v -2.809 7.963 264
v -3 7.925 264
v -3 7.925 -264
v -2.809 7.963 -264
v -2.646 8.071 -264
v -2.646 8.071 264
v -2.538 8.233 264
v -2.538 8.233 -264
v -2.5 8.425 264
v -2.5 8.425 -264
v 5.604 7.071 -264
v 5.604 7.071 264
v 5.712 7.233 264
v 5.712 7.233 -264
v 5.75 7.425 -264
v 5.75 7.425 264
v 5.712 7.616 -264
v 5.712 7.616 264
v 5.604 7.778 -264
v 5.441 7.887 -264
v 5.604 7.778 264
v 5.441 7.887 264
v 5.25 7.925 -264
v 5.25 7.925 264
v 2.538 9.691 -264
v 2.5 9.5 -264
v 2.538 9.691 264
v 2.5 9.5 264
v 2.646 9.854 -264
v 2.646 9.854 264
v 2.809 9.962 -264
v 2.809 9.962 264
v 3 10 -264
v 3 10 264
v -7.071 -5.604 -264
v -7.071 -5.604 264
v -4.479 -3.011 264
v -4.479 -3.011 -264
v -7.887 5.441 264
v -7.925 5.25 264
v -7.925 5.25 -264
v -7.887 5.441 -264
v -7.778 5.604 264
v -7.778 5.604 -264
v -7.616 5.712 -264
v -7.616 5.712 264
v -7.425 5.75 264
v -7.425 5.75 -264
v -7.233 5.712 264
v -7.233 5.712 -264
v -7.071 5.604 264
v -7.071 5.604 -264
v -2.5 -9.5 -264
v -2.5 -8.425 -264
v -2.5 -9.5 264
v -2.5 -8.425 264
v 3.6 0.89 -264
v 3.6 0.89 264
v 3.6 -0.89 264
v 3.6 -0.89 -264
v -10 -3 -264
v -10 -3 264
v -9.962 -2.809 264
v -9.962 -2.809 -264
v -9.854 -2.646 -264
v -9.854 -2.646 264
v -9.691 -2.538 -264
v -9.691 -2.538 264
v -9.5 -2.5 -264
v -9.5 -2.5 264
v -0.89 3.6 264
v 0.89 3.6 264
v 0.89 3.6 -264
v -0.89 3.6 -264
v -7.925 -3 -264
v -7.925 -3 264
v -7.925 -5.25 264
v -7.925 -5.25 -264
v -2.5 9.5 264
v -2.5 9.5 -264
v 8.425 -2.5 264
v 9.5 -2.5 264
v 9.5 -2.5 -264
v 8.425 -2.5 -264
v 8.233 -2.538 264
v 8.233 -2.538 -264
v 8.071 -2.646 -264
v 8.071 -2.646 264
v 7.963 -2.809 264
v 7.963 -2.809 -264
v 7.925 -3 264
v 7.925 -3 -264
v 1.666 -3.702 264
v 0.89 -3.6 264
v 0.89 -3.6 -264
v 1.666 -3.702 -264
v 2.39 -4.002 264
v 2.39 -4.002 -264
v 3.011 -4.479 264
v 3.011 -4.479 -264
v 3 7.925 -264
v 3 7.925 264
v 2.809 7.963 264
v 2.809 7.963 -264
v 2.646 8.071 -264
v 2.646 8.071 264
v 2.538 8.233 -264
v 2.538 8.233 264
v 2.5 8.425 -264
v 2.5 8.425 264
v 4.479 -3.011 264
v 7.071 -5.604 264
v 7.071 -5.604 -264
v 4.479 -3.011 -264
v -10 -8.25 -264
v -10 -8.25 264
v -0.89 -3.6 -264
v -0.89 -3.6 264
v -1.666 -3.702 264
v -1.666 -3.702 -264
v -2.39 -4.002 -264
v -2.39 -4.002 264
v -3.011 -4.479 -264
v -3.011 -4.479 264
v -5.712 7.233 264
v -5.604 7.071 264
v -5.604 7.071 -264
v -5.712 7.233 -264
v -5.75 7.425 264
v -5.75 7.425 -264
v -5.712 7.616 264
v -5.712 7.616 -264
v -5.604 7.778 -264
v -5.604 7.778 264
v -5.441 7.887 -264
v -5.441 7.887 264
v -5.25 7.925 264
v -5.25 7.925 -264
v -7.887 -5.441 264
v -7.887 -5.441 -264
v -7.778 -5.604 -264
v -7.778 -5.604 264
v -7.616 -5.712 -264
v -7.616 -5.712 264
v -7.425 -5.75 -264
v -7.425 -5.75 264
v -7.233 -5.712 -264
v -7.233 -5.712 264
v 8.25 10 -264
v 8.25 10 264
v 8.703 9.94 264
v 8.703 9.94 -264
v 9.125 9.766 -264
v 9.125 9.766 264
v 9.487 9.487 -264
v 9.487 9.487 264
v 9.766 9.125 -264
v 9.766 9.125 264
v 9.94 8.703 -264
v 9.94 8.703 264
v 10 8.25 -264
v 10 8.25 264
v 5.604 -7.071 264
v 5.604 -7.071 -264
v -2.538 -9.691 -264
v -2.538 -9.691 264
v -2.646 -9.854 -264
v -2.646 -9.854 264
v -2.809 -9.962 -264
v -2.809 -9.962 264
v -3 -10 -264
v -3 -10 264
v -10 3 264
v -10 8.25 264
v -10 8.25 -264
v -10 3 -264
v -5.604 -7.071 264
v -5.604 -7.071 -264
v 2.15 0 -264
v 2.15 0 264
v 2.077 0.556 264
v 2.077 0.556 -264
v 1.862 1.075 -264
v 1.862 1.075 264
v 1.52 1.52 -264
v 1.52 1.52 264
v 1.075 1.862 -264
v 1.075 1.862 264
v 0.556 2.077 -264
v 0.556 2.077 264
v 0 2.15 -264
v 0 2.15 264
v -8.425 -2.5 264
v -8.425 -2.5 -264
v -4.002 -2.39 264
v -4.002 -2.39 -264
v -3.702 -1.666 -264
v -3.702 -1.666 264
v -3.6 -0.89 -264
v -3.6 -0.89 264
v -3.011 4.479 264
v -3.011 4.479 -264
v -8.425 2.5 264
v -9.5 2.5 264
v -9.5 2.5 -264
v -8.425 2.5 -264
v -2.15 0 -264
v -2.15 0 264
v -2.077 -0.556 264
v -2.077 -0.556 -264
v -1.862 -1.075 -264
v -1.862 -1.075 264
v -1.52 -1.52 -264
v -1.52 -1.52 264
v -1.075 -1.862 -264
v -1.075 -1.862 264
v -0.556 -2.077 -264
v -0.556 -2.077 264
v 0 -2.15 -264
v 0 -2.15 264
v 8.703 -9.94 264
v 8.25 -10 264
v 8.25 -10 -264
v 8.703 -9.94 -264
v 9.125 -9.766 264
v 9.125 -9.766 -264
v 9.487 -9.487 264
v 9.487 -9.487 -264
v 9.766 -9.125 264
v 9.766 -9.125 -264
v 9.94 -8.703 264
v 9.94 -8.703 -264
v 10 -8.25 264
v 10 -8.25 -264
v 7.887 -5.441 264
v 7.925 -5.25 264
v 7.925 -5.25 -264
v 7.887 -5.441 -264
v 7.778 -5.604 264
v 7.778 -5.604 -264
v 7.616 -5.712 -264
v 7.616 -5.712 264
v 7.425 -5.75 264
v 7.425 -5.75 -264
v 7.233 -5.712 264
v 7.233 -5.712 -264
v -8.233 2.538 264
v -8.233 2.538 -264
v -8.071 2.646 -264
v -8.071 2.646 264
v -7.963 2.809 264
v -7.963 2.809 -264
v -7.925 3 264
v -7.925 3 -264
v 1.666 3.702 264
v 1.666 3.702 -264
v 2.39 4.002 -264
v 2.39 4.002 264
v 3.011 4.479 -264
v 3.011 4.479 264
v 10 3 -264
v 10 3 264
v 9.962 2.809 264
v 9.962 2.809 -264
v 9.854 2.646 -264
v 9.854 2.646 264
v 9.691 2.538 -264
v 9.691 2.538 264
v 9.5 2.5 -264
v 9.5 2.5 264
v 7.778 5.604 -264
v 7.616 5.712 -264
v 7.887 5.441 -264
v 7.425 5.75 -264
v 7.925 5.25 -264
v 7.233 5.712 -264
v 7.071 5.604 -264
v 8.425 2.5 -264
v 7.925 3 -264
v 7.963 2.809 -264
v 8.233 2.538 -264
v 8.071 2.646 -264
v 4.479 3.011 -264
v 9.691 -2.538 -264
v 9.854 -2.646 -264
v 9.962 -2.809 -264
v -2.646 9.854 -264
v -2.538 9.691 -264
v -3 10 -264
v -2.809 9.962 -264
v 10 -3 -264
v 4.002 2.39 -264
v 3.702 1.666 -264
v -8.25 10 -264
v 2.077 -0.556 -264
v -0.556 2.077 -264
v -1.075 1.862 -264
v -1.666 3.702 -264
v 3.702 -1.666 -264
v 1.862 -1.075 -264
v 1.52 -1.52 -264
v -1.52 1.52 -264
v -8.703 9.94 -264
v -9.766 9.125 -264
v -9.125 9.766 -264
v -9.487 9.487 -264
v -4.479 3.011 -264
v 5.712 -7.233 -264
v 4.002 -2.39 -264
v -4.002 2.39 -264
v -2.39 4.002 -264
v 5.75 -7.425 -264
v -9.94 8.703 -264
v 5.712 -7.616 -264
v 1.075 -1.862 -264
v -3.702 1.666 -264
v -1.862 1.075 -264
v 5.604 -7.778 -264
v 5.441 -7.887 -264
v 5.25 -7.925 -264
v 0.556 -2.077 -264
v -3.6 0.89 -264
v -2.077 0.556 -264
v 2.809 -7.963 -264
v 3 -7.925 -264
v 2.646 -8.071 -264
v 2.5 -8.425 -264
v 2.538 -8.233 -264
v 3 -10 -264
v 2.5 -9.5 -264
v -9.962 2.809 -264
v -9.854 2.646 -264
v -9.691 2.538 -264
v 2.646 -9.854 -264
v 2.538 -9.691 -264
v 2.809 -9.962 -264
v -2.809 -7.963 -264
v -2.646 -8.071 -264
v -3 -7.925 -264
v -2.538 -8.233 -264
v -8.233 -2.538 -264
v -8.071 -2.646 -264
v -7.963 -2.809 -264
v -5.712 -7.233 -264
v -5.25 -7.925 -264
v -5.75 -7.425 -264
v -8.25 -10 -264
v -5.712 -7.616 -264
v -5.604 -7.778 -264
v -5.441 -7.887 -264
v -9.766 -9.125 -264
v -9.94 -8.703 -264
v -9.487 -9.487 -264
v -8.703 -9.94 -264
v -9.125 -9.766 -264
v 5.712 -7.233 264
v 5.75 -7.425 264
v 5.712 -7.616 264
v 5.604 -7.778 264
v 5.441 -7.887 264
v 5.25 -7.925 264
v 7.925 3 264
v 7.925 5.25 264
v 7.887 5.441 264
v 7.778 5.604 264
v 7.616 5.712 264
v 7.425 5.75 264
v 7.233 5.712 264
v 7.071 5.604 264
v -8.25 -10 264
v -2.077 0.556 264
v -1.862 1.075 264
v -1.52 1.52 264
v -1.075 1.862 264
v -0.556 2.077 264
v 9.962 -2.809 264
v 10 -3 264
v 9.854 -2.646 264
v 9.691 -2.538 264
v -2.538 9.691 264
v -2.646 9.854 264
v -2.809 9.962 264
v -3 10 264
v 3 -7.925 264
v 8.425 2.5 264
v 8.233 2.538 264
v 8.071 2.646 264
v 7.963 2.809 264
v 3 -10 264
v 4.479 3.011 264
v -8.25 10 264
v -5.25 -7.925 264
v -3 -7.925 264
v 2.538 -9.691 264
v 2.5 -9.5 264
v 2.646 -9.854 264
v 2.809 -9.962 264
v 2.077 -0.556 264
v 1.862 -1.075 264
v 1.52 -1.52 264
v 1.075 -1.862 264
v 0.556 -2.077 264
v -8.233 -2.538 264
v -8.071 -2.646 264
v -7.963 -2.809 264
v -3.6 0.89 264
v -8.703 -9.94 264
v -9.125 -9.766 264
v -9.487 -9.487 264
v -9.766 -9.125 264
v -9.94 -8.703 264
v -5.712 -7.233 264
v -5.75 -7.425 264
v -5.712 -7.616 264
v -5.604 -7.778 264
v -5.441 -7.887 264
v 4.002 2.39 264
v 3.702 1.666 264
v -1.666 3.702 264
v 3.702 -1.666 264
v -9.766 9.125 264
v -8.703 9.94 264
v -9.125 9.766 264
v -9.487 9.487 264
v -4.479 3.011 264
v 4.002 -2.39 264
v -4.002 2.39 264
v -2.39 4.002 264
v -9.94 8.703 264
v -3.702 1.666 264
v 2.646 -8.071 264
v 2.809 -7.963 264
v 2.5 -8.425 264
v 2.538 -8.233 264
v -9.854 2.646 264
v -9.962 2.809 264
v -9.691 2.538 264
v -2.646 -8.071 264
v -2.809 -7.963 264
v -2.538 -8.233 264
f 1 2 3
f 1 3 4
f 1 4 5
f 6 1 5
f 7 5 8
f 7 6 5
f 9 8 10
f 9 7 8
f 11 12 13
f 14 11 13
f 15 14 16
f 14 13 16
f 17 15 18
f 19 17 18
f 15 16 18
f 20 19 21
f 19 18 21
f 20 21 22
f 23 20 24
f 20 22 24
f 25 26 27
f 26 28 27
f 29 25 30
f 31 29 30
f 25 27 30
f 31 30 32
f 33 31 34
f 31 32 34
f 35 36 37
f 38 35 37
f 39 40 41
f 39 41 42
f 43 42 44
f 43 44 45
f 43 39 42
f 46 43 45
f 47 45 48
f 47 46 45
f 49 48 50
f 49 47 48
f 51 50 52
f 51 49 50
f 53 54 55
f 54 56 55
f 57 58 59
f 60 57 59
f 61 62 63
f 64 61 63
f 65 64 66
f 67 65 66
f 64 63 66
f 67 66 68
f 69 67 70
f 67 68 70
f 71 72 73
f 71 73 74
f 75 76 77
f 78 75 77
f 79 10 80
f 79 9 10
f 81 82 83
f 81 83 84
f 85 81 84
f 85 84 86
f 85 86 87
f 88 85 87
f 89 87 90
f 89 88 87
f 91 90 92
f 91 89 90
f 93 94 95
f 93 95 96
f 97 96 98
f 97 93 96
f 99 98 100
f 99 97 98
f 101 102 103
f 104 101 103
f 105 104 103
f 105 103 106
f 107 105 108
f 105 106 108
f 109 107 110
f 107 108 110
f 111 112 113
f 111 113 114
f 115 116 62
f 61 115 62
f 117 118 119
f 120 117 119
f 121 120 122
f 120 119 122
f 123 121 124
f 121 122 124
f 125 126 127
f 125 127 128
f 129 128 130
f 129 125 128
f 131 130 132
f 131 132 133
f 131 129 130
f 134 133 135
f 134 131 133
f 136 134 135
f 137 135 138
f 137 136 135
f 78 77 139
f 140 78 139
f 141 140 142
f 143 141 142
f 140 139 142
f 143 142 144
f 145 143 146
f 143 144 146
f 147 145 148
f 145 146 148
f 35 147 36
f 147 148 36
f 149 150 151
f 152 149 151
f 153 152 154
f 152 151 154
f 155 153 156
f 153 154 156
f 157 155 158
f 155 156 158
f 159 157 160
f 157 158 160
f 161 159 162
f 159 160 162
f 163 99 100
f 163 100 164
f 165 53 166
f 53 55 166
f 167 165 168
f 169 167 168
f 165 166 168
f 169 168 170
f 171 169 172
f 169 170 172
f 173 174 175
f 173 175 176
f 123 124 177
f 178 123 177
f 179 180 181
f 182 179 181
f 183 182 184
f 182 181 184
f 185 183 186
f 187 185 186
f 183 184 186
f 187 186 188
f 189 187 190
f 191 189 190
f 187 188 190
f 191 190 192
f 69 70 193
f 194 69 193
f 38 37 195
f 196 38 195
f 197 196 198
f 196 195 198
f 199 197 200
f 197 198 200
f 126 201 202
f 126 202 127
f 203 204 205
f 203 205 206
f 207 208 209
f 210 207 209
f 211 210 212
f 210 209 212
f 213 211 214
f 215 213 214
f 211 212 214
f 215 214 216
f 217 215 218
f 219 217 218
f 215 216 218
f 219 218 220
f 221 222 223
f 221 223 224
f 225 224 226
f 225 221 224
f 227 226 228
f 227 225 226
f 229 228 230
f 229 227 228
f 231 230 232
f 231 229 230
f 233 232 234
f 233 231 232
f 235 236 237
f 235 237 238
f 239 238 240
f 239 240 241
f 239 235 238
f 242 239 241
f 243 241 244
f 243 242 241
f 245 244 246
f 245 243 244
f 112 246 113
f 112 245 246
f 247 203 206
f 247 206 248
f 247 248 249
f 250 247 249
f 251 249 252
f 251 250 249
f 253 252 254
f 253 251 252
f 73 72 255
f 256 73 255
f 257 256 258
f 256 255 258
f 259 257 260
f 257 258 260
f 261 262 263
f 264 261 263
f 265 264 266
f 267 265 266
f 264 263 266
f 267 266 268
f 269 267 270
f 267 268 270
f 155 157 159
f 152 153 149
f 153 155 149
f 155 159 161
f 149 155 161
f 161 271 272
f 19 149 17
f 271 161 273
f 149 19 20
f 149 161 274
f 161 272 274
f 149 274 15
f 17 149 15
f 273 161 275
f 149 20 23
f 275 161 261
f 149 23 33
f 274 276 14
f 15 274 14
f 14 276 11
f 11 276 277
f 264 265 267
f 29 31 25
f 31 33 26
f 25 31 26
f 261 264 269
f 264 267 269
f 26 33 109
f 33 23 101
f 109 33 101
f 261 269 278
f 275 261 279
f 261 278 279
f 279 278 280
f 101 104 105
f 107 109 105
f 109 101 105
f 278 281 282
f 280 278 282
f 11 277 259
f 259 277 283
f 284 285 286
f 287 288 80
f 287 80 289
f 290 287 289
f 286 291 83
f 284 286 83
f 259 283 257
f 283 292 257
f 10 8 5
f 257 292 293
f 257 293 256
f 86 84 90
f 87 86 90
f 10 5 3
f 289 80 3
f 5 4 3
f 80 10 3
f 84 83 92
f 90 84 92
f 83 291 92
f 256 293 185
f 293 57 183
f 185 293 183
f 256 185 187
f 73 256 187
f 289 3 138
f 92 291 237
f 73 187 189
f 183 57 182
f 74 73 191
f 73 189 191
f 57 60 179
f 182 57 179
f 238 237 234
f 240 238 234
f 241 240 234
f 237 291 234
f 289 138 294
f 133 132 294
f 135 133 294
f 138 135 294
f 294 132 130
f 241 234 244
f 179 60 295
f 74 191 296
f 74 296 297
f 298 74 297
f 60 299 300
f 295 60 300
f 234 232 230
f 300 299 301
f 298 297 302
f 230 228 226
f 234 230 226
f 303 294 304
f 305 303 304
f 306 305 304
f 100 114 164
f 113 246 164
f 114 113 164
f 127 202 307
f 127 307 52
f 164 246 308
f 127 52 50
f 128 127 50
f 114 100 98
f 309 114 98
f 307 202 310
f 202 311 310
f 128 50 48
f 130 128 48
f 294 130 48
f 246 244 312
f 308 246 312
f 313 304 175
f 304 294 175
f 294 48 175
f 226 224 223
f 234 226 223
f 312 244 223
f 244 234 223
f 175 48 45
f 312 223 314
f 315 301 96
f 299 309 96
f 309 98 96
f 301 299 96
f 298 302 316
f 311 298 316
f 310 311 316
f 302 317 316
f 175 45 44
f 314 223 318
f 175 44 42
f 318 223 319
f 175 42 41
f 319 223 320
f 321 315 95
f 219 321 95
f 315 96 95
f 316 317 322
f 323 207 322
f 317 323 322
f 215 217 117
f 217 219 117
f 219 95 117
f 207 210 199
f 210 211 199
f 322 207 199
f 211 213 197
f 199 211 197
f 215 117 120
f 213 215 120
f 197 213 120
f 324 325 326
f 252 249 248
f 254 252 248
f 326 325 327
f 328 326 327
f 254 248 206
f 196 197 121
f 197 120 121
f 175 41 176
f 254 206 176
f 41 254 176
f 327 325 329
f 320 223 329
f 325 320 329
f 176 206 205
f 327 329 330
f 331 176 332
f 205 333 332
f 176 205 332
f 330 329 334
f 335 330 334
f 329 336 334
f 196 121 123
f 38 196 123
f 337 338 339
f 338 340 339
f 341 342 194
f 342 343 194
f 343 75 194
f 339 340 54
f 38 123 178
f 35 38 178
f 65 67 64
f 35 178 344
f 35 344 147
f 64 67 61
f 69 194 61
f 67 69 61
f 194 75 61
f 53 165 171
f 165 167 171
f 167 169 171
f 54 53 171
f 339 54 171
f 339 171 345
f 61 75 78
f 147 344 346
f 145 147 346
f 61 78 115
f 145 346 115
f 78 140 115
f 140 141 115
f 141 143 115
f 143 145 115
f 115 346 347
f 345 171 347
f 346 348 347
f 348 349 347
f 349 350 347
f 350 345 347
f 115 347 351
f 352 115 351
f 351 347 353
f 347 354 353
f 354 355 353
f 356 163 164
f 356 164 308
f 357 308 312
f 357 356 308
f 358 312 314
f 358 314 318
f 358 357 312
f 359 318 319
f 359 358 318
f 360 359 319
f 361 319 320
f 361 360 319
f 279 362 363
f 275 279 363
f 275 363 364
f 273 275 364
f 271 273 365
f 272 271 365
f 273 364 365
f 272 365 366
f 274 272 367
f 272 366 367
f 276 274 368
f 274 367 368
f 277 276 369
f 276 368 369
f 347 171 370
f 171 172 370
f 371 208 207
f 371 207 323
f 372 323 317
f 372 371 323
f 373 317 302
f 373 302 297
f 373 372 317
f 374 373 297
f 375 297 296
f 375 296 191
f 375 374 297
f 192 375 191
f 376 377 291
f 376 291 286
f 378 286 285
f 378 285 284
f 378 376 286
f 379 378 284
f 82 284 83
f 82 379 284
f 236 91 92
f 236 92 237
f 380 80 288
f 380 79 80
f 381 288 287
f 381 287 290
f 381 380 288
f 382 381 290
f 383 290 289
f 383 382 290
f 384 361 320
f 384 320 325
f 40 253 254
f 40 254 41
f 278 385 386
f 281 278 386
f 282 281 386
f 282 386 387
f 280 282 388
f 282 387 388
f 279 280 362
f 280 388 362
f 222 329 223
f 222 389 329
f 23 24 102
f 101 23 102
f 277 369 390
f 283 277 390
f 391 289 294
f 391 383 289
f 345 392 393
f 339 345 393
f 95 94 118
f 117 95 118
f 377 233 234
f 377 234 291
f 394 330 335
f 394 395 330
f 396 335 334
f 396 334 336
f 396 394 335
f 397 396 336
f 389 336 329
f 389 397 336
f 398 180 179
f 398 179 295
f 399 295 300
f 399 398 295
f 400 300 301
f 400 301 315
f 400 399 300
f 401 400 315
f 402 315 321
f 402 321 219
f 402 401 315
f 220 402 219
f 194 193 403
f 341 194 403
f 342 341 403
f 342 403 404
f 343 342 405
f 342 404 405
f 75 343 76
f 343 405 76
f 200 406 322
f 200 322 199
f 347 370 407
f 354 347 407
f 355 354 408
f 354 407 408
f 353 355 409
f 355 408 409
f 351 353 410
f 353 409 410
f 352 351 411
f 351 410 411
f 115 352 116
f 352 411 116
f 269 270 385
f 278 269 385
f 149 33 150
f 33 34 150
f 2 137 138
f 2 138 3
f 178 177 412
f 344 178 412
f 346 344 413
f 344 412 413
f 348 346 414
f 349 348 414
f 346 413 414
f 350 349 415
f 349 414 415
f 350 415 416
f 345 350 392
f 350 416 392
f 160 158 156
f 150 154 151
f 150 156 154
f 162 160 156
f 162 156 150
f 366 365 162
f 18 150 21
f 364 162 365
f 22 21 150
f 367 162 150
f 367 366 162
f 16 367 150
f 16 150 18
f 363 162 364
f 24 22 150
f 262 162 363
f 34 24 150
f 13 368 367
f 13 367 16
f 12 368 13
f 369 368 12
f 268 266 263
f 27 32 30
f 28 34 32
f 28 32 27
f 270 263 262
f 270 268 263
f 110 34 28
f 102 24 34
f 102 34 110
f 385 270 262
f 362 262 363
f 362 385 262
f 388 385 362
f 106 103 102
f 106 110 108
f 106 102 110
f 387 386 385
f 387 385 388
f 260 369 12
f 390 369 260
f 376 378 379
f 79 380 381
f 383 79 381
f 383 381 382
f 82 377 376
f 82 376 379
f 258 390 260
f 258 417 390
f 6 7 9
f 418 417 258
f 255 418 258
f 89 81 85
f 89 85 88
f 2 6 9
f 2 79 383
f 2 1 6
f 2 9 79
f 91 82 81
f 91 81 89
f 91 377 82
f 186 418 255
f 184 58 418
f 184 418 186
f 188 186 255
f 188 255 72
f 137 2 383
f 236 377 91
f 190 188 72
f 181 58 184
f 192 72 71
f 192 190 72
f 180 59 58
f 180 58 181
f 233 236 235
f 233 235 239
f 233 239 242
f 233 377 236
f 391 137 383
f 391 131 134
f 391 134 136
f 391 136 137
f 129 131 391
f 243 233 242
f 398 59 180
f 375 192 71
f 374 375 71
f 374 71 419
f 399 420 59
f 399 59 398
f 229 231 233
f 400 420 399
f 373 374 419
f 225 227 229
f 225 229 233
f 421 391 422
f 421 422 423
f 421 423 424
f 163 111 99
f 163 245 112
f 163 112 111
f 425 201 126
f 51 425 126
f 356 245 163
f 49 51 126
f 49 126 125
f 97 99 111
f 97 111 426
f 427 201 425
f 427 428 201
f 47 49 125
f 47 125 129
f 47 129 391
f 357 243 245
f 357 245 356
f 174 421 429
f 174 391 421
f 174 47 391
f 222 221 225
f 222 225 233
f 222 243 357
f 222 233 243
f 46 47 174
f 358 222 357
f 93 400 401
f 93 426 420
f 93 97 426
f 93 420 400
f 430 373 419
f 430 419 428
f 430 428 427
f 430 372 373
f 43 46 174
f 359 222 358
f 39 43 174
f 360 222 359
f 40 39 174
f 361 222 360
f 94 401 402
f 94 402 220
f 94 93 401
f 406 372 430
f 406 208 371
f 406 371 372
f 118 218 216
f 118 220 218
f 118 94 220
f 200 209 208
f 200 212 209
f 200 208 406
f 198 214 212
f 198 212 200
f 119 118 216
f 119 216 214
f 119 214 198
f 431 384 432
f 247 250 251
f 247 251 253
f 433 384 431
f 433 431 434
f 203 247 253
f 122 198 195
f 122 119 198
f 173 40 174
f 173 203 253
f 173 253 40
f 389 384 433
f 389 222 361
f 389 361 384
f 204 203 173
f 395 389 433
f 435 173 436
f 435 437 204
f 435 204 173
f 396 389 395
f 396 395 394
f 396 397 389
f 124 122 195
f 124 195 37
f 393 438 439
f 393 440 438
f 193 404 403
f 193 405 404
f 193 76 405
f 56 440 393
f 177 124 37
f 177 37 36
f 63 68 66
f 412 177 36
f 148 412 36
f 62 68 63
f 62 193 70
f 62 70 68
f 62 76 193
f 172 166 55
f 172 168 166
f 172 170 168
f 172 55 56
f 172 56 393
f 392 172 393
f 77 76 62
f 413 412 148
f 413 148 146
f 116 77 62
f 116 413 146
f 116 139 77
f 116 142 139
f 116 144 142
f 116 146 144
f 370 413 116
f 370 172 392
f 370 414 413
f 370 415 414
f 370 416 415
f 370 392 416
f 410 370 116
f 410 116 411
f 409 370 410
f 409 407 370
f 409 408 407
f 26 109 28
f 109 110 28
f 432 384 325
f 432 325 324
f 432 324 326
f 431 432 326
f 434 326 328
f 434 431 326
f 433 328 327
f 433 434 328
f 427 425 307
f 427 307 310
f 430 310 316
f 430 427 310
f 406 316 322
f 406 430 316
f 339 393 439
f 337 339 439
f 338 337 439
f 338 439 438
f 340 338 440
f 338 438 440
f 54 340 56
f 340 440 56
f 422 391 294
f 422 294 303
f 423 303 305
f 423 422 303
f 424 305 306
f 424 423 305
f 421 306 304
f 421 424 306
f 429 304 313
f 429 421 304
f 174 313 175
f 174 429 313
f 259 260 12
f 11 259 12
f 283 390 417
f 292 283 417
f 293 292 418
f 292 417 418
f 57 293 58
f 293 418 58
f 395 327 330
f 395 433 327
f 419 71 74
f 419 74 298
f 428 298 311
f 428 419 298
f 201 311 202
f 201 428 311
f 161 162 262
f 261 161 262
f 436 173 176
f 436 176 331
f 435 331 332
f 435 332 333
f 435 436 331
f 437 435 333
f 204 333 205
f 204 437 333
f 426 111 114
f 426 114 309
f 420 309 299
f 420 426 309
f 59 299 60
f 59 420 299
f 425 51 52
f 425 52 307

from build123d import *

# Parameters (mm, degrees)
BOSS_EXTRUDE1_DEPTH = 264


with BuildPart() as part:
    # Sketch4 → Boss-Extrude1 (new body, symmetric)
    with BuildSketch(Plane.XY):
        with BuildLine():
            Line((3, -10), (8.25, -10))
            ThreePointArc((8.25, -10), (9.487436867, -9.487436867), (10, -8.25))
            Line((10, -8.25), (10, -3))
            ThreePointArc((10, -3), (9.853553391, -2.646446609), (9.5, -2.5))
            Line((9.5, -2.5), (8.424621202, -2.5))
            ThreePointArc((8.424621202, -2.5), (8.071067812, -2.646446609), (7.924621202, -3))
            Line((7.924621202, -3), (7.924621202, -5.25))
            ThreePointArc((7.924621202, -5.25), (7.615962919, -5.711939766), (7.071067812, -5.603553391))
            Line((7.071067812, -5.603553391), (4.478679656, -3.011165235))
            ThreePointArc((4.478679656, -3.011165235), (3.828361402, -2.037895189), (3.6, -0.889844892))
            Line((3.6, -0.889844892), (3.6, 0))
            Line((3.6, 0), (2.15, 0))
            ThreePointArc((2.15, 0), (1.52027958, -1.52027958), (0, -2.15))
            Line((0, -2.15), (0, -3.6))
            Line((0, -3.6), (0.889844892, -3.6))
            ThreePointArc((0.889844892, -3.6), (2.037895189, -3.828361402), (3.011165235, -4.478679656))
            Line((3.011165235, -4.478679656), (5.603553391, -7.071067812))
            ThreePointArc((5.603553391, -7.071067812), (5.711939766, -7.615962919), (5.25, -7.924621202))
            Line((5.25, -7.924621202), (3, -7.924621202))
            ThreePointArc((3, -7.924621202), (2.646446609, -8.071067812), (2.5, -8.424621202))
            Line((2.5, -8.424621202), (2.5, -9.5))
            ThreePointArc((2.5, -9.5), (2.646446609, -9.853553391), (3, -10))
        make_face()
    extrude(amount=BOSS_EXTRUDE1_DEPTH, both=True)

    # Mirror1: part across plane


with BuildPart() as part_1:
    add(part.part)
    add(part.part.mirror(Plane(origin=(0, 0, 0), x_dir=(0, 0, 1), z_dir=(1, 0, 0))))

    # Mirror2: part across plane


with BuildPart() as part_2:
    add(part_1.part)
    add(part_1.part.mirror(Plane.ZX))


solid = part_2.part
